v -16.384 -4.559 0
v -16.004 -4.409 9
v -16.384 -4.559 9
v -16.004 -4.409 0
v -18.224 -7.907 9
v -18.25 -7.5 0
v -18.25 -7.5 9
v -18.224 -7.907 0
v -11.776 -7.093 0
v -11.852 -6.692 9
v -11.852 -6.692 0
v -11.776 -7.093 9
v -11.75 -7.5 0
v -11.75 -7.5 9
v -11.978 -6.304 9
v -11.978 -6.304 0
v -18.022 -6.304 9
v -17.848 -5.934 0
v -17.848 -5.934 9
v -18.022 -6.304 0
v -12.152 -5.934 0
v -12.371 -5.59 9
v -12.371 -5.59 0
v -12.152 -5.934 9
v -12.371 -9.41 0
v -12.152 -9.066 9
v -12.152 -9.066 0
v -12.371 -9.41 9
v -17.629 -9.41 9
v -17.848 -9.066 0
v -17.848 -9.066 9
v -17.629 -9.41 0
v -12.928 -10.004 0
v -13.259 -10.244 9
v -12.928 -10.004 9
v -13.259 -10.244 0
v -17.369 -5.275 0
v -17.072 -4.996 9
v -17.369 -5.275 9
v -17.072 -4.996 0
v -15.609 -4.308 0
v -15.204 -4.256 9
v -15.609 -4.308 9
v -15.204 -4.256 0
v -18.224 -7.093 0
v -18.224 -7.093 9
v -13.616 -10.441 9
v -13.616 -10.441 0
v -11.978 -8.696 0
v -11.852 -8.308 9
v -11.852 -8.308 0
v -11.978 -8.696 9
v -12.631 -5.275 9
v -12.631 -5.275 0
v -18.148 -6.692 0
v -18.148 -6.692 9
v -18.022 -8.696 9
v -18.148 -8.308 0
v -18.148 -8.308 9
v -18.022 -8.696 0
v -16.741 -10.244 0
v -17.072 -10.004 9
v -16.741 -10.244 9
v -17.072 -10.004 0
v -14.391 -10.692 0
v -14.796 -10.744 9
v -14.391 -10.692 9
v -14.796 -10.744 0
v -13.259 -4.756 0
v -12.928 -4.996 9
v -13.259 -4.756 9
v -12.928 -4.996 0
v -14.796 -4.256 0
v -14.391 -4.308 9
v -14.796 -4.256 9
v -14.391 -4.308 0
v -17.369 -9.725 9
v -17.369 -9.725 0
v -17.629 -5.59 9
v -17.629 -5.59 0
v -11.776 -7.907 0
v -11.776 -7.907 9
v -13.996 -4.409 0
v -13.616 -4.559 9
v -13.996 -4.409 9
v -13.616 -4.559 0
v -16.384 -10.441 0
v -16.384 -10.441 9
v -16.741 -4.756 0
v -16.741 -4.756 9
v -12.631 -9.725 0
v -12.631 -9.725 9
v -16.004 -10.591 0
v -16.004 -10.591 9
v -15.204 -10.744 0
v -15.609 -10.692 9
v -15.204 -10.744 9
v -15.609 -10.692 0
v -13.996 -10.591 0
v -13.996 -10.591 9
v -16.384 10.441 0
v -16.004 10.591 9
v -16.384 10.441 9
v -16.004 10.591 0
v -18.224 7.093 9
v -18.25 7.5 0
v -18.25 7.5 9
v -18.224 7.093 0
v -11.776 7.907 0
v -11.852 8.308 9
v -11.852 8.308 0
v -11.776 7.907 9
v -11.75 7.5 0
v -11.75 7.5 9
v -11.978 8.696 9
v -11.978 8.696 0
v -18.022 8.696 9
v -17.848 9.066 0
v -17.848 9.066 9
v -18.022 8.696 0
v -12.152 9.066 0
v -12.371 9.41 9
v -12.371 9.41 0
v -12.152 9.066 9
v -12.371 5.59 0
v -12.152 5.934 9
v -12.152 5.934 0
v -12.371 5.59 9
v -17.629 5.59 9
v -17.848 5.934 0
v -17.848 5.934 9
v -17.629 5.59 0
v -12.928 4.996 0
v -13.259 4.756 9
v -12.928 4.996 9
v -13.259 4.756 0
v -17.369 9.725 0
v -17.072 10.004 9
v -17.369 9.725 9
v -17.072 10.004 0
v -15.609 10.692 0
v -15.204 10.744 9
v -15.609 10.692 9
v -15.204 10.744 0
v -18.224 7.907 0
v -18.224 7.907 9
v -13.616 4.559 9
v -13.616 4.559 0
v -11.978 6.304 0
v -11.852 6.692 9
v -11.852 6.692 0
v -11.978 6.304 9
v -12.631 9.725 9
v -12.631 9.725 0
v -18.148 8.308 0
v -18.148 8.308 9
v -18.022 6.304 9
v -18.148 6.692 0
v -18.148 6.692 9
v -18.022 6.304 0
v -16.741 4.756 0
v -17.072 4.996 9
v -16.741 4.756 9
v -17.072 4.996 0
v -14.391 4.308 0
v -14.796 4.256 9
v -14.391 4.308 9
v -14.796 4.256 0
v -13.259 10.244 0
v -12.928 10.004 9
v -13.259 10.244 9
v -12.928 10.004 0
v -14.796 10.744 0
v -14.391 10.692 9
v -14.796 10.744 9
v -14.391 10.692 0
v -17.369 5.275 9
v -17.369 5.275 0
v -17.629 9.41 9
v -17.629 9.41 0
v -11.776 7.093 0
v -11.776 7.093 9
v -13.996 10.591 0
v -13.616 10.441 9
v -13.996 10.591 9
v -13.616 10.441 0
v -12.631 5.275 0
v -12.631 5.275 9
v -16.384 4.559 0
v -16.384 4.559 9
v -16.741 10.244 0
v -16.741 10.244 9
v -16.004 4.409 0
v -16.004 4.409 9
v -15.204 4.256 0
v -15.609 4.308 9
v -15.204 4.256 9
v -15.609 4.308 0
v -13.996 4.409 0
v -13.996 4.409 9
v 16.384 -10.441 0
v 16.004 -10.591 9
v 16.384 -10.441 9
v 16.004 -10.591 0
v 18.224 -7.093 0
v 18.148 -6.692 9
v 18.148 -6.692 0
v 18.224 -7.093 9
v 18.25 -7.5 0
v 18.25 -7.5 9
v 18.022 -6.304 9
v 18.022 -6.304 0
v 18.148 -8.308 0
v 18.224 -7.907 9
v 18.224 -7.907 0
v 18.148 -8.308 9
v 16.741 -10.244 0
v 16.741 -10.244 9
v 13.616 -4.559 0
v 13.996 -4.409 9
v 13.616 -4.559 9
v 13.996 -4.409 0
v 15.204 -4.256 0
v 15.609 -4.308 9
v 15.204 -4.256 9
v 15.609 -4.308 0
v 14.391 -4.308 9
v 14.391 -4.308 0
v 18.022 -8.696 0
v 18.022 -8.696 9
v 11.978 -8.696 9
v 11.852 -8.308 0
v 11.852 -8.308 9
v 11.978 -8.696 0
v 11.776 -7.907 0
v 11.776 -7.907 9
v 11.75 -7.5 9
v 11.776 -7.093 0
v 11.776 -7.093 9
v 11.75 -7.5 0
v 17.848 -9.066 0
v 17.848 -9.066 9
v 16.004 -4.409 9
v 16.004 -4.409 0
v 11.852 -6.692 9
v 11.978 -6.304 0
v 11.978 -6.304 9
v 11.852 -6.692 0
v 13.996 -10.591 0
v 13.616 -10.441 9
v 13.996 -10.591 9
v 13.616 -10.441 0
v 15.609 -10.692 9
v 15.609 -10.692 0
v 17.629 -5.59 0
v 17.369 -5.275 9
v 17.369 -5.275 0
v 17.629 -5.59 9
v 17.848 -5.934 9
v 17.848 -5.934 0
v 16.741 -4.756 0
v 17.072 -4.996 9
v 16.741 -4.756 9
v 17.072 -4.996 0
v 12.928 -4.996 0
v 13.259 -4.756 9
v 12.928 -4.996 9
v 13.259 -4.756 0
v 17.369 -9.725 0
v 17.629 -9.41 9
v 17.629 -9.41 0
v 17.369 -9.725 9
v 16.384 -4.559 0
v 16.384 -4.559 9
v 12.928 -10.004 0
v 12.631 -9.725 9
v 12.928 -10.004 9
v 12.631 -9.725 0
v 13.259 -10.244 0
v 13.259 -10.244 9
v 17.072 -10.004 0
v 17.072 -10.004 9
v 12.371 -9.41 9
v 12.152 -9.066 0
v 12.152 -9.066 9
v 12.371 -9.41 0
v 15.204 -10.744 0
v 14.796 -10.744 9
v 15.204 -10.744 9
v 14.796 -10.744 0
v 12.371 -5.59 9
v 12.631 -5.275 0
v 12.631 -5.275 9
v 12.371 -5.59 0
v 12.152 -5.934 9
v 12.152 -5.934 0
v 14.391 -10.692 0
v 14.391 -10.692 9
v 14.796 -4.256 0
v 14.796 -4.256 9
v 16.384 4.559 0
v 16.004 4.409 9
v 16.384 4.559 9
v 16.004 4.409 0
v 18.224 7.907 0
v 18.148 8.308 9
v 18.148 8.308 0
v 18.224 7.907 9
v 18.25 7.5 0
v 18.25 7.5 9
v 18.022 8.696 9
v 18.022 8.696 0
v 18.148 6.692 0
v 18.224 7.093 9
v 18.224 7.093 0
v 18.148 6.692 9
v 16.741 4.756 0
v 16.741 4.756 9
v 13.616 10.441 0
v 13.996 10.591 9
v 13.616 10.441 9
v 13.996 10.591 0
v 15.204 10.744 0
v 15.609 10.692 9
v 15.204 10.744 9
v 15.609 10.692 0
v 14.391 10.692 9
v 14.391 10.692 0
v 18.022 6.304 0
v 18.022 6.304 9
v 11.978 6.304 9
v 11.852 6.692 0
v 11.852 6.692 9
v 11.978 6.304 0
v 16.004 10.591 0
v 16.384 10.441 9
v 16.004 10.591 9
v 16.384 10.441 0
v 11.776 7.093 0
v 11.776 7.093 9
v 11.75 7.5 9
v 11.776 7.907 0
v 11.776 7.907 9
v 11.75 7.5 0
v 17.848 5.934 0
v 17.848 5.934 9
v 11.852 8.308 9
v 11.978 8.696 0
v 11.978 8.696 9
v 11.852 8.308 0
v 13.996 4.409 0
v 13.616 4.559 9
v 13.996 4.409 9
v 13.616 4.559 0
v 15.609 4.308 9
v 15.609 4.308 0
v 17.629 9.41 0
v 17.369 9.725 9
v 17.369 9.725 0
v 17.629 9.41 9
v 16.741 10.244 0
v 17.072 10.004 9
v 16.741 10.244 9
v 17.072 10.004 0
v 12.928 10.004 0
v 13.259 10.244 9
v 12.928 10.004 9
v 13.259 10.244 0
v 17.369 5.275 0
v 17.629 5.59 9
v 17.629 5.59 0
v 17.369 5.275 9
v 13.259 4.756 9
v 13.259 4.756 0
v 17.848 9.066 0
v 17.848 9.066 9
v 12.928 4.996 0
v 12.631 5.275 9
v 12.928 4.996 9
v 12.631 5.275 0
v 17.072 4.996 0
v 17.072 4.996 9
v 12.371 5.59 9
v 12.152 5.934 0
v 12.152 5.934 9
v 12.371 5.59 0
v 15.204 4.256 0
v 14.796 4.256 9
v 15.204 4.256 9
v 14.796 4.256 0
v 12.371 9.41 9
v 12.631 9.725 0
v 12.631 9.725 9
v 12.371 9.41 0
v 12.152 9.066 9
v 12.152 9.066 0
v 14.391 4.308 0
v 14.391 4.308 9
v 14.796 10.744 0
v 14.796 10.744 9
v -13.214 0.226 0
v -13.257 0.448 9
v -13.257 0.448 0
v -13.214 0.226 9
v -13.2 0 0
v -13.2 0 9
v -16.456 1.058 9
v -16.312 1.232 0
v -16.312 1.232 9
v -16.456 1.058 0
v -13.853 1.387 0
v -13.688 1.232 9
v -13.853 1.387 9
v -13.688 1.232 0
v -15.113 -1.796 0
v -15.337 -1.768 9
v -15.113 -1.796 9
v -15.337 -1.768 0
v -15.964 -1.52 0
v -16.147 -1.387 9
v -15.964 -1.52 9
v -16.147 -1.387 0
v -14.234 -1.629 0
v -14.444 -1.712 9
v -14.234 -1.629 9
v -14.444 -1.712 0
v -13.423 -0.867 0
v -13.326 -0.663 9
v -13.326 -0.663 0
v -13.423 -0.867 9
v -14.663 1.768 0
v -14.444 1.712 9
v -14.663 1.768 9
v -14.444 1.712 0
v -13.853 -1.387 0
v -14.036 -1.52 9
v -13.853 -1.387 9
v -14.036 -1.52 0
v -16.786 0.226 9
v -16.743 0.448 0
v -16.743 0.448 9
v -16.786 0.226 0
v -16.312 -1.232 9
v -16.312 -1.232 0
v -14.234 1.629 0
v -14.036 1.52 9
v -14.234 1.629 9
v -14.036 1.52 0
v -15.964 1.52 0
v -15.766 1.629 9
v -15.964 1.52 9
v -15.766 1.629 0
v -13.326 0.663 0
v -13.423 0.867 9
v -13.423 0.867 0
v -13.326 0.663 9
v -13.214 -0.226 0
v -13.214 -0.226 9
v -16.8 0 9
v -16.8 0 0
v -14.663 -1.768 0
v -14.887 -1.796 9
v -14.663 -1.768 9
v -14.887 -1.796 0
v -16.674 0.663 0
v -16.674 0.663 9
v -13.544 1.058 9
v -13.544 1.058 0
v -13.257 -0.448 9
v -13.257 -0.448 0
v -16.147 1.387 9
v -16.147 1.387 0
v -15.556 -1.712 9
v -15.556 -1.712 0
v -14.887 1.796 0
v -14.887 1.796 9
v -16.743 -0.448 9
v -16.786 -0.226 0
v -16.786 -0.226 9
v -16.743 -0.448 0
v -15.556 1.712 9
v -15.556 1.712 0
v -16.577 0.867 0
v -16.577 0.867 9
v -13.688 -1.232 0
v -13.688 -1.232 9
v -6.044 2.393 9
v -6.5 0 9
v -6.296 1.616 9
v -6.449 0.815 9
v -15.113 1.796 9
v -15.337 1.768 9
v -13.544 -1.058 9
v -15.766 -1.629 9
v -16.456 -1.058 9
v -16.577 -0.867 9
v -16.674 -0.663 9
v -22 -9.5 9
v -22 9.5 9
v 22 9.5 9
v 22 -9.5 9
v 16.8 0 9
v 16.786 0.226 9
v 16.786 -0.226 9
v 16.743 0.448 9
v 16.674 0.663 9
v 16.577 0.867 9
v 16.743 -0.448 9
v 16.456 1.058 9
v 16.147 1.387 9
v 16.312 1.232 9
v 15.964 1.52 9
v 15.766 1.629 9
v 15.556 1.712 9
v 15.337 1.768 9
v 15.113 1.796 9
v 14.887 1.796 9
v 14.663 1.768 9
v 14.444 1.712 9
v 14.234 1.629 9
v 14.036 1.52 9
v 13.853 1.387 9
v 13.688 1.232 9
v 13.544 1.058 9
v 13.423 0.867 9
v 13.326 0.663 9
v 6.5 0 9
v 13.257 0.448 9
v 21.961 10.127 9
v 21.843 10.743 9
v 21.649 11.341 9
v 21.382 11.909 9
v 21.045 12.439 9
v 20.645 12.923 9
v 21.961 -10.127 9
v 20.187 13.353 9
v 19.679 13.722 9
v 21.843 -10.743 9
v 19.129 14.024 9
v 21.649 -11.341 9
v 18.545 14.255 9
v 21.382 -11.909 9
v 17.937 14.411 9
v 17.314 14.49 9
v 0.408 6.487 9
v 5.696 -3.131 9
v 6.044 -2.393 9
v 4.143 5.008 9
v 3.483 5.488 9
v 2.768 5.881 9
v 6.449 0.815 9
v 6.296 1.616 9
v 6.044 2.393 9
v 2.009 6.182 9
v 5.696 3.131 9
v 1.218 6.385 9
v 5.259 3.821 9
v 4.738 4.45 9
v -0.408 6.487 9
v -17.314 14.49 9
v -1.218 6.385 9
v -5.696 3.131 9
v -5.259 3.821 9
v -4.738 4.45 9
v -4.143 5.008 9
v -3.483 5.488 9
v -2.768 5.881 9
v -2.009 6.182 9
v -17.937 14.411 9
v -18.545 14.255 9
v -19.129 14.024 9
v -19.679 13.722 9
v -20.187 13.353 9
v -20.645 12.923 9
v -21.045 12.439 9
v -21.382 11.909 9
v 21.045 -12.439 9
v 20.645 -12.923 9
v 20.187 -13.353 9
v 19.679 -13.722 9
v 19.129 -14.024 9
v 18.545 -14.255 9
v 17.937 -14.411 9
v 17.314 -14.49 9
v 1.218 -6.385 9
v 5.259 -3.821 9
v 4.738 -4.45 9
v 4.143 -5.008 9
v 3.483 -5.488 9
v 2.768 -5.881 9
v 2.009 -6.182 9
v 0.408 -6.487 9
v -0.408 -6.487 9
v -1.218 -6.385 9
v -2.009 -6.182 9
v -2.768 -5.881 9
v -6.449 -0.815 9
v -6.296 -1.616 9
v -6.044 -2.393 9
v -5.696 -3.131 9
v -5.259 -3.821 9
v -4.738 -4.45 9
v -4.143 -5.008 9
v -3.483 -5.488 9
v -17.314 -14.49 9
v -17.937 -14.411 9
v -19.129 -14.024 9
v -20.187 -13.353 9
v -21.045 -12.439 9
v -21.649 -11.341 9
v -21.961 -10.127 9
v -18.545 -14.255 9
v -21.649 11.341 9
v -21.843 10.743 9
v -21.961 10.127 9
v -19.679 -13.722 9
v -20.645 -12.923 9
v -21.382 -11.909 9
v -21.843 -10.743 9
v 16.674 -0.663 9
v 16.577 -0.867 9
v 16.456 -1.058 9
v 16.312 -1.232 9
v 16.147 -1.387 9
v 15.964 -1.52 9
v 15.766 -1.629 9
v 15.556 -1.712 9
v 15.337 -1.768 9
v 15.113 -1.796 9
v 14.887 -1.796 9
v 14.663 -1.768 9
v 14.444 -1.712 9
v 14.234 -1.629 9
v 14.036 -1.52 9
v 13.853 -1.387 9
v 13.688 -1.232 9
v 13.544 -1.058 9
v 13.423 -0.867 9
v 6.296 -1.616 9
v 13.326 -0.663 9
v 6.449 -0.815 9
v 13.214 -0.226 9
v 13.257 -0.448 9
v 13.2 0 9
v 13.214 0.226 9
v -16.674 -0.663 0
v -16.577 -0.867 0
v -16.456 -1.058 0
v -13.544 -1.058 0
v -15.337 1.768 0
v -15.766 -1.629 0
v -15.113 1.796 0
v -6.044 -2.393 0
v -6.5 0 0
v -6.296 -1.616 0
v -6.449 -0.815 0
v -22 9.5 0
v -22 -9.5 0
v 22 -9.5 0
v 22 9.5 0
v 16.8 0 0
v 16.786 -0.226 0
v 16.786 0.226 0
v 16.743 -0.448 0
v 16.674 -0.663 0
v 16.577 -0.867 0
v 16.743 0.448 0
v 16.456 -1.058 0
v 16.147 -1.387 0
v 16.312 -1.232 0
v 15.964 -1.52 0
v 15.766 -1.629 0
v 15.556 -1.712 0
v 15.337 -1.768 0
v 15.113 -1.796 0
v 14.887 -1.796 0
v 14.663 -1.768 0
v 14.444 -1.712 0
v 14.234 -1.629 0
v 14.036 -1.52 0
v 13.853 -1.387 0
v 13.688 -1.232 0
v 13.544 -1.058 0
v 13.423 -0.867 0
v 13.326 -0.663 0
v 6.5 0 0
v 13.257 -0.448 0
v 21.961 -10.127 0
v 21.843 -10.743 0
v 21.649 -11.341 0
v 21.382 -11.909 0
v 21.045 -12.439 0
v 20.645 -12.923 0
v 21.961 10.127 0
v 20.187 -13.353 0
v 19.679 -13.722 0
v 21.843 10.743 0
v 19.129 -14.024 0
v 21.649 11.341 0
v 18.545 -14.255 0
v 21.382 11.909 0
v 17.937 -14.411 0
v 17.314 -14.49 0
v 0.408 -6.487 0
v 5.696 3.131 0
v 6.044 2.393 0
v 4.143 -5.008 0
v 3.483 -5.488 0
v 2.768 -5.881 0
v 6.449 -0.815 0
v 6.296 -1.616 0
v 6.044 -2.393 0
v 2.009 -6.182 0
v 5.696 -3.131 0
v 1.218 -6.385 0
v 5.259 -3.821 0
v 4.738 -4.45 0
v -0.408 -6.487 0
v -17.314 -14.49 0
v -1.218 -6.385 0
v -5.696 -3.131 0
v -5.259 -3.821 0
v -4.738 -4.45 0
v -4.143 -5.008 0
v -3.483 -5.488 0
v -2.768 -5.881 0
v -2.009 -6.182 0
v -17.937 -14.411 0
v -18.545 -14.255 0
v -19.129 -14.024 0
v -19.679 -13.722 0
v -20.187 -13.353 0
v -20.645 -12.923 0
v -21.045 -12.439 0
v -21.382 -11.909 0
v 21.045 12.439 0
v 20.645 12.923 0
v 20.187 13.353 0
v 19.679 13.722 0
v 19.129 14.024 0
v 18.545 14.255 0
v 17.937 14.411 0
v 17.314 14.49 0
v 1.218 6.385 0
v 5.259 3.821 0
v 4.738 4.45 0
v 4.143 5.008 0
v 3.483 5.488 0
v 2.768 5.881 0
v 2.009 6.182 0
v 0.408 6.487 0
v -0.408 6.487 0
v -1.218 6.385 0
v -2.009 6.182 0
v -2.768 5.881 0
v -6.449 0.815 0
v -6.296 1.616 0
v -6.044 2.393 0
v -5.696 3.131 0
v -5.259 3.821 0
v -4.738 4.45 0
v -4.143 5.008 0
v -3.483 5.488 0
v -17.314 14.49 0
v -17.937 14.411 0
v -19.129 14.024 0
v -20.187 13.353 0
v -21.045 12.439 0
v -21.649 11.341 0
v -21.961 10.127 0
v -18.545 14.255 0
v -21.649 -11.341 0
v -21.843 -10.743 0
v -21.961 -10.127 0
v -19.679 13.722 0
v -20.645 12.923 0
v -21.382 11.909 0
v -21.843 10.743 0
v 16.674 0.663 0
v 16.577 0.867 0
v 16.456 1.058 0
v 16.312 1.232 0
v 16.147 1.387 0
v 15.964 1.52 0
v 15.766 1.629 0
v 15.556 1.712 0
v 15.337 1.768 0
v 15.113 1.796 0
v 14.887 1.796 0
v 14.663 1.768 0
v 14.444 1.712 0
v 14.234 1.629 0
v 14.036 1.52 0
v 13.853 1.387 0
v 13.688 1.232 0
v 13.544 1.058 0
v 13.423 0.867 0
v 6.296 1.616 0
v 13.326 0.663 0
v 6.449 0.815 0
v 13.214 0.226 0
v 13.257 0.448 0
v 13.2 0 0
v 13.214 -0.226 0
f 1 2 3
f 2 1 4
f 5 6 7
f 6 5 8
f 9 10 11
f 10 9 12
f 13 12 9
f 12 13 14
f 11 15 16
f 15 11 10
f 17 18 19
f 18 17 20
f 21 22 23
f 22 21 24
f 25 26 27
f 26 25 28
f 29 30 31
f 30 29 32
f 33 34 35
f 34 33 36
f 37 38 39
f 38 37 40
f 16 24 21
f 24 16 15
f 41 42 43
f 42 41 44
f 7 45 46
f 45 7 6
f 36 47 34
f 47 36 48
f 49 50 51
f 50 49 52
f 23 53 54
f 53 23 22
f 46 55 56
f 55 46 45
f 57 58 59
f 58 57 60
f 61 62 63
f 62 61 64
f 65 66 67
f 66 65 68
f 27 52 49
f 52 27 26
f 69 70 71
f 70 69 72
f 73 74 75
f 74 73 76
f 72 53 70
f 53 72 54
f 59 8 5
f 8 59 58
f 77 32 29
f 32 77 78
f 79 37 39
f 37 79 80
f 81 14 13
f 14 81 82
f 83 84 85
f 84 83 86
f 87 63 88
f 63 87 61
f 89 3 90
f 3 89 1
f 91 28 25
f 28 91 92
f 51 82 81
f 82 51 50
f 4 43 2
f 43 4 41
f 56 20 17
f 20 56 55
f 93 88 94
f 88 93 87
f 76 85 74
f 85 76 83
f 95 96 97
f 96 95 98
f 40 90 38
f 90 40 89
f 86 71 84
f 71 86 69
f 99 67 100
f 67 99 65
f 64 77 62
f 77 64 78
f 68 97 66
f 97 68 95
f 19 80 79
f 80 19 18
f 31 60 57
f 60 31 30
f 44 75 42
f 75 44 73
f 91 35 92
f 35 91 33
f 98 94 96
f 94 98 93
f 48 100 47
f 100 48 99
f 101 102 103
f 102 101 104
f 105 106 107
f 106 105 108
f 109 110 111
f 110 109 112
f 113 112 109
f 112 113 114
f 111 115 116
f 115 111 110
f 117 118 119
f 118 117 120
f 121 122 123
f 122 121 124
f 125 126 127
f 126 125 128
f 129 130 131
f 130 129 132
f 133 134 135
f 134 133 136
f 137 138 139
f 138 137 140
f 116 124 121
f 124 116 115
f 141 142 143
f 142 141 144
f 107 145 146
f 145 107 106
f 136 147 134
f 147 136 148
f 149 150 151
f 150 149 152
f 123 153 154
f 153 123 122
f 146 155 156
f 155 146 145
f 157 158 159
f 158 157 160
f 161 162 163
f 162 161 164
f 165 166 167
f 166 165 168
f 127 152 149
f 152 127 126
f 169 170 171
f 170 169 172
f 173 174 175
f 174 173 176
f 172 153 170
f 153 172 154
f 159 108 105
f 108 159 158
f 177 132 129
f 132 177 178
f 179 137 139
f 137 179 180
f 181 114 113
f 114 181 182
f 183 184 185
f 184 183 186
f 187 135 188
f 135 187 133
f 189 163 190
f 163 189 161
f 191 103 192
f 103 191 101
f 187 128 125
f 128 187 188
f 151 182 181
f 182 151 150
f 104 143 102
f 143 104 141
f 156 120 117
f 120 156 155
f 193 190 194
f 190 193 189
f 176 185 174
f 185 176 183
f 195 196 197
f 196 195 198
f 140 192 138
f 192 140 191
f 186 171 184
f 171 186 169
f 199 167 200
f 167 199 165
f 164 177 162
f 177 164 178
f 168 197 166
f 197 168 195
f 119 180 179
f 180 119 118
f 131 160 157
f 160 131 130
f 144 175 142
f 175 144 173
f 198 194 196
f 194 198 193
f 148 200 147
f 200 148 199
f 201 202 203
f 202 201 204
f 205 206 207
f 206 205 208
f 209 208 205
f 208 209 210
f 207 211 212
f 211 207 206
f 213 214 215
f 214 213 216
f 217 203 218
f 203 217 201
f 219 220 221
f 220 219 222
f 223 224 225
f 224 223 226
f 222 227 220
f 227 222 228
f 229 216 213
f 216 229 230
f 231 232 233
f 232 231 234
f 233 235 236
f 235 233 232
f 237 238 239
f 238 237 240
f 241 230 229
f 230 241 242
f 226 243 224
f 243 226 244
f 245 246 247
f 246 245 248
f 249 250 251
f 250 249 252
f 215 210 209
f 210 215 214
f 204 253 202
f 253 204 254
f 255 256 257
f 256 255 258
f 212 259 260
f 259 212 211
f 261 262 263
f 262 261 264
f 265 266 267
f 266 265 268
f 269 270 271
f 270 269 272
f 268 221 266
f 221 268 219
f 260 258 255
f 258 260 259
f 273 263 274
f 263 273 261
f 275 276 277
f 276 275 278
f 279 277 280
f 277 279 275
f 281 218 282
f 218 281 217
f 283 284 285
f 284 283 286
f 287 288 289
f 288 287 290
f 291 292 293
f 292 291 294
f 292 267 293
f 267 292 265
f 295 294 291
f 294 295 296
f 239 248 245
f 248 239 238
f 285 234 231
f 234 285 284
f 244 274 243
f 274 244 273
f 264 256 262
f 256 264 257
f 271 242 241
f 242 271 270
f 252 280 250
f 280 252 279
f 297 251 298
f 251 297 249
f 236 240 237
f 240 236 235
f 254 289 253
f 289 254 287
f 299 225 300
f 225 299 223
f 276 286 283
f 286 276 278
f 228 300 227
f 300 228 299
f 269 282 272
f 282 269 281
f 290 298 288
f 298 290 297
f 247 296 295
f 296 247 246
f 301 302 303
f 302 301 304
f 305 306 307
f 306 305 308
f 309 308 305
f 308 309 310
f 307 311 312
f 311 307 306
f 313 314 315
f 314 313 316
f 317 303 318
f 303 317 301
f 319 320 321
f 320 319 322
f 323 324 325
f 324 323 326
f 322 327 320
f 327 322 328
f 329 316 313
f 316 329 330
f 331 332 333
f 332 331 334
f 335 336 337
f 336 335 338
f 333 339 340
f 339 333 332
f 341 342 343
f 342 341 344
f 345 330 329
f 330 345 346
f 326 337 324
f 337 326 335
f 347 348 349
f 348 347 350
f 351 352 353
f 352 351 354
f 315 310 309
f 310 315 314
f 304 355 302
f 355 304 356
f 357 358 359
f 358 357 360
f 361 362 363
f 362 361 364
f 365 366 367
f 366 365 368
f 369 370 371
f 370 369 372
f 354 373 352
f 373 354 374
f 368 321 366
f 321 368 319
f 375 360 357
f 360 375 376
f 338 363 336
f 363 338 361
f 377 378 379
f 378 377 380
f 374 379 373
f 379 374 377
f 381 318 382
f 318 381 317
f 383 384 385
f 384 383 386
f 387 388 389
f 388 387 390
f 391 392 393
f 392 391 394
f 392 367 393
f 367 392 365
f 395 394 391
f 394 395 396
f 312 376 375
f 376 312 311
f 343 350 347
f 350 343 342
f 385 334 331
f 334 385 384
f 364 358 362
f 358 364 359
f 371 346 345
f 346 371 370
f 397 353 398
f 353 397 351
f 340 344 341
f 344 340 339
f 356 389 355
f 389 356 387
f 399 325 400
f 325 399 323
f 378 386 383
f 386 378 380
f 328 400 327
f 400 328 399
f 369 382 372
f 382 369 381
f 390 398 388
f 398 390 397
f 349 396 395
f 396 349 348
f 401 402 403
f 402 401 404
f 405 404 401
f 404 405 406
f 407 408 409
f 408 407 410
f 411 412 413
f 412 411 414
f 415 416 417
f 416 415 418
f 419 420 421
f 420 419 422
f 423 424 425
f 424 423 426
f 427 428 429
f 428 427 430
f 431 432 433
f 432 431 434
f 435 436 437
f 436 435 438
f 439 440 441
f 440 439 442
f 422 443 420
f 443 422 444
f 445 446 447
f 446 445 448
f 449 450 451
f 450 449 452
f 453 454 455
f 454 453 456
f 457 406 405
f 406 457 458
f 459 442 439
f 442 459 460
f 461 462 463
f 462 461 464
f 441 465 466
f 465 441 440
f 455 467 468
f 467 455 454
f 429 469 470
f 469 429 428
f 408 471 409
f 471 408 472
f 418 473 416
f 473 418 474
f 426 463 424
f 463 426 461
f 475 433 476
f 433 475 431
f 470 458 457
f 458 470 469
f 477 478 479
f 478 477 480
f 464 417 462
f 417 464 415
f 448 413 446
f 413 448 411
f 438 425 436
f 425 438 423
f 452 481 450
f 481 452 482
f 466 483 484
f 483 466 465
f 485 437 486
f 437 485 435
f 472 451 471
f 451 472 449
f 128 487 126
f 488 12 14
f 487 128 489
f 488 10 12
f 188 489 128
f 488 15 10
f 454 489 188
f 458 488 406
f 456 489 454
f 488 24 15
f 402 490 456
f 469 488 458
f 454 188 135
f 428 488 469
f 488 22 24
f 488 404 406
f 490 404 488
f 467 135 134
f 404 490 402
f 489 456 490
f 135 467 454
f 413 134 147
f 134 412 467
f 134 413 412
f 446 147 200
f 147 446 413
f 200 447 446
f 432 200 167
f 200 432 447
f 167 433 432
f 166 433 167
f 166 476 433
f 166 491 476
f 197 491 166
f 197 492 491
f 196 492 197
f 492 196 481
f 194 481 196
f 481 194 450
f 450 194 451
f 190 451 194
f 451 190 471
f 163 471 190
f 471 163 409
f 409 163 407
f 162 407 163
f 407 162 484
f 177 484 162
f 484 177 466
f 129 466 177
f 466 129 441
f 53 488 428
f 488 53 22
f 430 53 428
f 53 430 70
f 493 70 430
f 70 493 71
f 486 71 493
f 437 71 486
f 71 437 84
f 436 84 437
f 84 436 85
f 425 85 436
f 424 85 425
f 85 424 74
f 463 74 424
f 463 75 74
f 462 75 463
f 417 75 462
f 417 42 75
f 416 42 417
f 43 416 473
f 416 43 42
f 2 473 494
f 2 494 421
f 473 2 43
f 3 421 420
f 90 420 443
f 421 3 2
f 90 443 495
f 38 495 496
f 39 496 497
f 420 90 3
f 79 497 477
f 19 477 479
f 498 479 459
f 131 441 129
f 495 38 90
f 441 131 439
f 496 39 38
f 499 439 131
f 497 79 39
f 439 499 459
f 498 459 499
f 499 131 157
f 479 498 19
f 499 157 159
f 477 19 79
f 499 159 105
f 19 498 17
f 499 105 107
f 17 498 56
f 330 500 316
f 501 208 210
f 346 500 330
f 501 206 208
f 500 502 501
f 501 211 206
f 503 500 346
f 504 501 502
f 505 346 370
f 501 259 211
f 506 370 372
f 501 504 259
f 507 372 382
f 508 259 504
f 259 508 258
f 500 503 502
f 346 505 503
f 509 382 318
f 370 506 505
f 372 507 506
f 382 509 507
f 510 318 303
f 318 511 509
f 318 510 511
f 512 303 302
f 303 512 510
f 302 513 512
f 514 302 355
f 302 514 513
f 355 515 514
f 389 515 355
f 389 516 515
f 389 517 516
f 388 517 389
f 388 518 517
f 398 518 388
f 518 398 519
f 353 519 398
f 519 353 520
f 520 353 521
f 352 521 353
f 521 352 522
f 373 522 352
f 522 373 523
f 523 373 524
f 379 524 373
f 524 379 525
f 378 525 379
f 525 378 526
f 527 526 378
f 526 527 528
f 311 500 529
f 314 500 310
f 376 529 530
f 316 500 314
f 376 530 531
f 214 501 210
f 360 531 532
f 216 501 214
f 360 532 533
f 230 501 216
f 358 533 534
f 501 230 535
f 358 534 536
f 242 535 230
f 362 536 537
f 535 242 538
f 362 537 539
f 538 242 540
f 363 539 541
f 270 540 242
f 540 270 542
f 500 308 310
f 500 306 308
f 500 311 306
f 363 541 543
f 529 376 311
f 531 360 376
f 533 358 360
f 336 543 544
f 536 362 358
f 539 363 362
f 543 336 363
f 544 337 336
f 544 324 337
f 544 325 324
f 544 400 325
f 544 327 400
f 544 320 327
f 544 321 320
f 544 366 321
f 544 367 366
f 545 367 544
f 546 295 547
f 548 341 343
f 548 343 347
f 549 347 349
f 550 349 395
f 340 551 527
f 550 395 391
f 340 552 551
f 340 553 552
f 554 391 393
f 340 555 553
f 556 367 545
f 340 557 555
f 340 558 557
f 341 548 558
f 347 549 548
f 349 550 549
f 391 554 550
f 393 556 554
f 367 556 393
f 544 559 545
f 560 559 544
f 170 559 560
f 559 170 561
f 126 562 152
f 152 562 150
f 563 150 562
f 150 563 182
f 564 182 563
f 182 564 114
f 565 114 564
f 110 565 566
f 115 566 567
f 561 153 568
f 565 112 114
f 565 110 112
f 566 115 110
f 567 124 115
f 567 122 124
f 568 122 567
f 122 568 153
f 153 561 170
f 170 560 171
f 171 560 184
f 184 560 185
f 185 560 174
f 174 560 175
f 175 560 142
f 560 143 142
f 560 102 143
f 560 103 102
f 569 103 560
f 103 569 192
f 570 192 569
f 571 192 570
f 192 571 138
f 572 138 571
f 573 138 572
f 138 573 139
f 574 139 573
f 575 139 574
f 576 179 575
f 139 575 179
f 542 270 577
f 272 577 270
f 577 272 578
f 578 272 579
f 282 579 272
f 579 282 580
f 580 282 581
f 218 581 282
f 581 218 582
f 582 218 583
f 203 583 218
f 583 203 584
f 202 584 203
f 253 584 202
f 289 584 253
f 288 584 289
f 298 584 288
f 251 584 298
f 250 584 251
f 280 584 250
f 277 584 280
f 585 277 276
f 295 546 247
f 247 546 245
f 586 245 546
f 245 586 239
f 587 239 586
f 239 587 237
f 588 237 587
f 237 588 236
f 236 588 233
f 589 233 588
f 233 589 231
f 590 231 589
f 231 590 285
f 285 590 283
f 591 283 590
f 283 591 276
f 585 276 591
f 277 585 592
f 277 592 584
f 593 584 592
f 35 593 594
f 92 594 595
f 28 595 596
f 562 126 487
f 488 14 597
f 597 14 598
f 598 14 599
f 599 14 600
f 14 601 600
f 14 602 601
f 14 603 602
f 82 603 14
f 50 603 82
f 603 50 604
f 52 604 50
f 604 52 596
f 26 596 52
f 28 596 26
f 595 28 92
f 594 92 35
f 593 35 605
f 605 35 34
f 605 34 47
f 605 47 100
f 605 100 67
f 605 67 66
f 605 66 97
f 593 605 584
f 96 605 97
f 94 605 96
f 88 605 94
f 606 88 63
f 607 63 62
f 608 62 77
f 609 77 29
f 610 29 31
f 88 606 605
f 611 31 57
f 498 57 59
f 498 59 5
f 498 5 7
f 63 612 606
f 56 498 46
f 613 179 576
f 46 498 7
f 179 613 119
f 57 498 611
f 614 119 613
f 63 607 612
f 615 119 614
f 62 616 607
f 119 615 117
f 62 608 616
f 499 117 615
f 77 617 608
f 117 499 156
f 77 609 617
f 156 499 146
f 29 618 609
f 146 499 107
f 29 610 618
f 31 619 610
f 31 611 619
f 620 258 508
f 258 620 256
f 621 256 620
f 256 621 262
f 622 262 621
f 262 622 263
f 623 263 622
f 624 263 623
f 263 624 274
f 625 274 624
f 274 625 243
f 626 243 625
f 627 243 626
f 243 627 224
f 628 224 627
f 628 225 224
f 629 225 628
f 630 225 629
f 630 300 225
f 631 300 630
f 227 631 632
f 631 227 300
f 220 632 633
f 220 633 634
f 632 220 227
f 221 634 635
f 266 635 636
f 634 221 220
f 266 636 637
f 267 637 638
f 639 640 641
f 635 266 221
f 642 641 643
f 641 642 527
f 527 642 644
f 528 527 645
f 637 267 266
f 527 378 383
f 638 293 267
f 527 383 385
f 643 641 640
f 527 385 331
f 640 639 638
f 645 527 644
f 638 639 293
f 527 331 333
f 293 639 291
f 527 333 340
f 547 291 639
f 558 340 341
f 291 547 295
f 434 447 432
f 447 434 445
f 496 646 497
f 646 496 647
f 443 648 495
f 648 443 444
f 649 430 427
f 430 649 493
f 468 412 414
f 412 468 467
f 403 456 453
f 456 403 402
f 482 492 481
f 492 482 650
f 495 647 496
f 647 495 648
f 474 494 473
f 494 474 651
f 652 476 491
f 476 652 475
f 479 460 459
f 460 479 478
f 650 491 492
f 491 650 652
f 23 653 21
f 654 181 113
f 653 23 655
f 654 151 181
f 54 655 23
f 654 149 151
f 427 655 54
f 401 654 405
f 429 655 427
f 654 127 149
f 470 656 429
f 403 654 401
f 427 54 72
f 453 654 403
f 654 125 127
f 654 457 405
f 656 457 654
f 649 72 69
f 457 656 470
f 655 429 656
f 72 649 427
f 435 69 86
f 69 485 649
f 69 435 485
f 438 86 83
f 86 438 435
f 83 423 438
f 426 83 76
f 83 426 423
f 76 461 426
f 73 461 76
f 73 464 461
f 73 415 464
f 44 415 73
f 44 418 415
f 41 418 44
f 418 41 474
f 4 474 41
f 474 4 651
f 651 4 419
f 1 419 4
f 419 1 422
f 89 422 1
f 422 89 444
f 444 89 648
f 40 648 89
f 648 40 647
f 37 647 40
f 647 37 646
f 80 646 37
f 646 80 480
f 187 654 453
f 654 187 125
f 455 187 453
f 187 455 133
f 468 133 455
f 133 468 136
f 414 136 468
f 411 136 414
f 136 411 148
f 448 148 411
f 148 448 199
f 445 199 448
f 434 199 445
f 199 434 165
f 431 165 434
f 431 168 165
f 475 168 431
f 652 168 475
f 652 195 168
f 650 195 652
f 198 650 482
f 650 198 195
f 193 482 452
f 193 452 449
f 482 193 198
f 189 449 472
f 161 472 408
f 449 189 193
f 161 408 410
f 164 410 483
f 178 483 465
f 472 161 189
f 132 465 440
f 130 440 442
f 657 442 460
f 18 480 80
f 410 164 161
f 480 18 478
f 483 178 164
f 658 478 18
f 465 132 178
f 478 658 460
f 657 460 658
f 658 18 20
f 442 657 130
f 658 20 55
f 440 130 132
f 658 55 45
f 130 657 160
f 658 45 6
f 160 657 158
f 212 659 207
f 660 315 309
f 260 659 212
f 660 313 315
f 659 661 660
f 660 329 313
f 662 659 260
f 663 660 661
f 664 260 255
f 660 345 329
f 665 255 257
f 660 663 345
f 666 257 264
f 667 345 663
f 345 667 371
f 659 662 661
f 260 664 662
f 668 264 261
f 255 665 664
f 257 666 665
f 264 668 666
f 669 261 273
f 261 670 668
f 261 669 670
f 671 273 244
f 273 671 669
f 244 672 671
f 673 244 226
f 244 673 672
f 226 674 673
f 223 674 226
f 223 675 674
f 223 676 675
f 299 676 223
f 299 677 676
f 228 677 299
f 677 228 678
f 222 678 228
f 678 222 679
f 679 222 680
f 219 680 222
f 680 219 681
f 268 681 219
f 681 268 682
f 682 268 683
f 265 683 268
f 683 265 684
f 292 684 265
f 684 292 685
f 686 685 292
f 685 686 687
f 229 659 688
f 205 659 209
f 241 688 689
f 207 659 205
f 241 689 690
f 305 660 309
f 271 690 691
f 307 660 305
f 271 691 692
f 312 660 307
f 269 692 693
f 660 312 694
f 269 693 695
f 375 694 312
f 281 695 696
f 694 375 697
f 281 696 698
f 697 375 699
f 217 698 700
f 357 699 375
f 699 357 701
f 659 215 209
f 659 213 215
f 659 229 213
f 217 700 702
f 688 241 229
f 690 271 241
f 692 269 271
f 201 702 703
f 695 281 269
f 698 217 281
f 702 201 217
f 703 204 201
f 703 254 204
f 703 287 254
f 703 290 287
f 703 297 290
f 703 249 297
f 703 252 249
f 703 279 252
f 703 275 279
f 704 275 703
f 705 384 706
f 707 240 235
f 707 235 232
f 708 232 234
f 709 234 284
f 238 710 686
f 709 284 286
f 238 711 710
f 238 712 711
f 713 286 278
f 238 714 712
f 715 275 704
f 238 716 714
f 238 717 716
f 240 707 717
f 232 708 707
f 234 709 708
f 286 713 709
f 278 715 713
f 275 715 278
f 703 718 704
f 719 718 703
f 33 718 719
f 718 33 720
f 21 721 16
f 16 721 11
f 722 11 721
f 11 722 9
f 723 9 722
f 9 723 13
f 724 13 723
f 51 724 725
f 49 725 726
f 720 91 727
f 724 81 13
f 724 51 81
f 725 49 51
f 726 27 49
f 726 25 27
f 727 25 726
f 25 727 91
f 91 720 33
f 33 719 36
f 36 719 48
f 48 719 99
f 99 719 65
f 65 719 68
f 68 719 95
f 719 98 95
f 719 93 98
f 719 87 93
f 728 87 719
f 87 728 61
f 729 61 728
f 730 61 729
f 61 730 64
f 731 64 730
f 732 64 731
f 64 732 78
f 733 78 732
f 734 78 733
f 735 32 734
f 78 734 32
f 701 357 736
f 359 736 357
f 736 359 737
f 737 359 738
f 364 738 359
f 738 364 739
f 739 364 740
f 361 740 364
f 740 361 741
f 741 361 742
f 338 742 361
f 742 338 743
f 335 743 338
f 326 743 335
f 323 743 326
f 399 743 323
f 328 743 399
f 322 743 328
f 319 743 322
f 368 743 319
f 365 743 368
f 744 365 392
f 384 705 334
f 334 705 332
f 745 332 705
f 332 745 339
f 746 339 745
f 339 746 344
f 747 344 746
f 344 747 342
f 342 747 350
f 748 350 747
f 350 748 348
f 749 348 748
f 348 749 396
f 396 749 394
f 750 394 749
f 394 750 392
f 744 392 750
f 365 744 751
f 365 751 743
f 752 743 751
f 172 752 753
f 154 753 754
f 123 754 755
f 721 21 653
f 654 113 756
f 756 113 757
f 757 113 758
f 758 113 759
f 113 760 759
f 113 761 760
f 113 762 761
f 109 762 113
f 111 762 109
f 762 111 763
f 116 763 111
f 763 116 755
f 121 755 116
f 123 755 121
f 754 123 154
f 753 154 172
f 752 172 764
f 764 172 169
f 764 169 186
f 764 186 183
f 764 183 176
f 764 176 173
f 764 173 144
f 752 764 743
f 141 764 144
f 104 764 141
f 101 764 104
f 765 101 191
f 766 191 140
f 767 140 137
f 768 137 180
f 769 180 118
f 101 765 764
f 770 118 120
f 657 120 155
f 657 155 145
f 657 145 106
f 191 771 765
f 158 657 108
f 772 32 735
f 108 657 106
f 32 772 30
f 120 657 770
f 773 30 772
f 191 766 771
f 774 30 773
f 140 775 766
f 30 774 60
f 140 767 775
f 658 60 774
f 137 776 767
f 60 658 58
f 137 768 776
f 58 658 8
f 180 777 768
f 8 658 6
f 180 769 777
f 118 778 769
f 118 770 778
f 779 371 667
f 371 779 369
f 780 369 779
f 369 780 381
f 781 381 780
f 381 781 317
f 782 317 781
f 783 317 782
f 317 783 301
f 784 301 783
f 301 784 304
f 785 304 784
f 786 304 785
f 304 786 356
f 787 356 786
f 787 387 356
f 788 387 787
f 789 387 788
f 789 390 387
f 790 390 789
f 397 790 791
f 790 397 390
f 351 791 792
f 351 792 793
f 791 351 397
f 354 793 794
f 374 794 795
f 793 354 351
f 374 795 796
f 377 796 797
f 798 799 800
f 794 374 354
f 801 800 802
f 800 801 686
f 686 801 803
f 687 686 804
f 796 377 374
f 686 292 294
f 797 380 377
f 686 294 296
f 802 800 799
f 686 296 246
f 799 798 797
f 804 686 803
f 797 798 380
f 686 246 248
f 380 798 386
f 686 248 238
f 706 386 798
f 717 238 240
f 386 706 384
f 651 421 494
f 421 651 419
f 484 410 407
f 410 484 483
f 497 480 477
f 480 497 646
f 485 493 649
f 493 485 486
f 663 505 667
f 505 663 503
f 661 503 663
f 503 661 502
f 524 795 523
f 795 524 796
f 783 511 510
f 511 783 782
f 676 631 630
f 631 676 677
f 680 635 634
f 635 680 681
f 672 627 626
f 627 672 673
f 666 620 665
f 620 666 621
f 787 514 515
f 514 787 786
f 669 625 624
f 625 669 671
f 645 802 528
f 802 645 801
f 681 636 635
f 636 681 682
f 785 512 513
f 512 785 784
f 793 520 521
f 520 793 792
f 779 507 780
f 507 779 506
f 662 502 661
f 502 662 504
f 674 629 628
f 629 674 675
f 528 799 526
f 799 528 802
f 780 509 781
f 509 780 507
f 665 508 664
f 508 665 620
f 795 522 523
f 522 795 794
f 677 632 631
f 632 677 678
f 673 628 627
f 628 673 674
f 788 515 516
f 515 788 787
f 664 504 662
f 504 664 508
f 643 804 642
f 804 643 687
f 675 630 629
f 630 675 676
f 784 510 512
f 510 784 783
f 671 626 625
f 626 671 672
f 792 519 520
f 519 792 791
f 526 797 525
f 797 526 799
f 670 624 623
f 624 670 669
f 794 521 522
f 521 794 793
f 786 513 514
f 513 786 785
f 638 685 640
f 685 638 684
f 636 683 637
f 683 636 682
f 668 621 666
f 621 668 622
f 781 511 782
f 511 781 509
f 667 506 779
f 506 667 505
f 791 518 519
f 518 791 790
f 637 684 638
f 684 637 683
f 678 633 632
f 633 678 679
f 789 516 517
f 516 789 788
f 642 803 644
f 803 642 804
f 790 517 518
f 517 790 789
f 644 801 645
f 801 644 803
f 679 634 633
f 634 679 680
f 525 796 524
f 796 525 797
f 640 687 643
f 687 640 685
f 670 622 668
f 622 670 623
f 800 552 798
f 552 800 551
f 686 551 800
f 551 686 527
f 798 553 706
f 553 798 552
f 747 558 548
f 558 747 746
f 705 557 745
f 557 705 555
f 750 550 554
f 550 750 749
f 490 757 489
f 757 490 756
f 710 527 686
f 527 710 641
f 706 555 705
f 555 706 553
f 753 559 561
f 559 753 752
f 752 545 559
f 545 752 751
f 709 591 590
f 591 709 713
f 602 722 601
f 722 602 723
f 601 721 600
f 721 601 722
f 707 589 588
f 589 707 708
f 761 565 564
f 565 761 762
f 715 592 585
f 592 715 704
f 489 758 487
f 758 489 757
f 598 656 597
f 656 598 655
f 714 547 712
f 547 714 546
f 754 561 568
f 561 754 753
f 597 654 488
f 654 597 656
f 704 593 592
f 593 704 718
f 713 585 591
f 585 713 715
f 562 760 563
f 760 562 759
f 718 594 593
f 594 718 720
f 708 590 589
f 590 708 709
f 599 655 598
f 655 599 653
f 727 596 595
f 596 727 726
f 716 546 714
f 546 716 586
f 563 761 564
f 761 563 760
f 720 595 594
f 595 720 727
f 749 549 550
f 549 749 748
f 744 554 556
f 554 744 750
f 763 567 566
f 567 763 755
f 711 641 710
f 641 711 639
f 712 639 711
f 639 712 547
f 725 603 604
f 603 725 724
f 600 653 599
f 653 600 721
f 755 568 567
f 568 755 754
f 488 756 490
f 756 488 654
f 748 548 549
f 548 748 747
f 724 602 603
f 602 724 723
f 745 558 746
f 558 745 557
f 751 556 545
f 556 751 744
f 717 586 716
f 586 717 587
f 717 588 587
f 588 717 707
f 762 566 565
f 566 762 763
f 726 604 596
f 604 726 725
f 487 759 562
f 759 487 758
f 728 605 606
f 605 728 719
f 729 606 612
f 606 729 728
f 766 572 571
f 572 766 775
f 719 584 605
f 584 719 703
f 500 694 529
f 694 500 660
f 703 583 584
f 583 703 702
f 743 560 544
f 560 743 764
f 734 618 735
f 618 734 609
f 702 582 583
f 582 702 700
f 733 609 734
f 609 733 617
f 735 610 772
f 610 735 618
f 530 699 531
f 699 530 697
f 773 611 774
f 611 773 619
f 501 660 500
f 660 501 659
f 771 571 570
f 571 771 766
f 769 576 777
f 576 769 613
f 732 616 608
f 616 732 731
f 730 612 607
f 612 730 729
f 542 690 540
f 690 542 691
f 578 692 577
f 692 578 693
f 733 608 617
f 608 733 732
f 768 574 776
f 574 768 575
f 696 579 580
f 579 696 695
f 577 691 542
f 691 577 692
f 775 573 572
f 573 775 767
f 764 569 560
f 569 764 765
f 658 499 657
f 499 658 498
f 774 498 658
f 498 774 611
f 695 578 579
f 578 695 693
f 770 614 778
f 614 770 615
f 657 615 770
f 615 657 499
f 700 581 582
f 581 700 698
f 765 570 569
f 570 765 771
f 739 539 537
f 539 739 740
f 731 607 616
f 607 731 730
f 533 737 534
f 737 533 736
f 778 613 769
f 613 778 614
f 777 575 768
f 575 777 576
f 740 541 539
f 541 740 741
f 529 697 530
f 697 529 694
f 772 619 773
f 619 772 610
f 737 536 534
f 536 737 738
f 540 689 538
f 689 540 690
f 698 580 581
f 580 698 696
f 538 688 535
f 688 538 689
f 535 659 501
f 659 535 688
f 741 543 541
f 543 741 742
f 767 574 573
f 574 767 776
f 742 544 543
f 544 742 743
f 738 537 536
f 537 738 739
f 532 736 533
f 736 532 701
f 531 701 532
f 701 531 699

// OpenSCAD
$fn = 50;


difference() {
	union() {
		hull() {
			translate(v = [-17.0000000000, 9.5000000000, 0]) {
				cylinder(h = 9, r = 5);
			}
			translate(v = [17.0000000000, 9.5000000000, 0]) {
				cylinder(h = 9, r = 5);
			}
			translate(v = [-17.0000000000, -9.5000000000, 0]) {
				cylinder(h = 9, r = 5);
			}
			translate(v = [17.0000000000, -9.5000000000, 0]) {
				cylinder(h = 9, r = 5);
			}
		}
	}
	union() {
		#translate(v = [-15.0000000000, -7.5000000000, 0]) {
			cylinder(h = 9, r = 3.2500000000);
		}
		#translate(v = [-15.0000000000, 7.5000000000, 0]) {
			cylinder(h = 9, r = 3.2500000000);
		}
		#translate(v = [15.0000000000, -7.5000000000, 0]) {
			cylinder(h = 9, r = 3.2500000000);
		}
		#translate(v = [15.0000000000, 7.5000000000, 0]) {
			cylinder(h = 9, r = 3.2500000000);
		}
		#translate(v = [-15.0000000000, -7.5000000000, -100.0000000000]) {
			cylinder(h = 200, r = 3.2500000000);
		}
		#translate(v = [-15.0000000000, 7.5000000000, -100.0000000000]) {
			cylinder(h = 200, r = 3.2500000000);
		}
		#translate(v = [15.0000000000, -7.5000000000, -100.0000000000]) {
			cylinder(h = 200, r = 3.2500000000);
		}
		#translate(v = [15.0000000000, 7.5000000000, -100.0000000000]) {
			cylinder(h = 200, r = 3.2500000000);
		}
		#translate(v = [-15.0000000000, -7.5000000000, 0]) {
			cylinder(h = 9, r = 1.8000000000);
		}
		#translate(v = [-15.0000000000, 0.0000000000, 0]) {
			cylinder(h = 9, r = 1.8000000000);
		}
		#translate(v = [-15.0000000000, 7.5000000000, 0]) {
			cylinder(h = 9, r = 1.8000000000);
		}
		#translate(v = [15.0000000000, -7.5000000000, 0]) {
			cylinder(h = 9, r = 1.8000000000);
		}
		#translate(v = [15.0000000000, 0.0000000000, 0]) {
			cylinder(h = 9, r = 1.8000000000);
		}
		#translate(v = [15.0000000000, 7.5000000000, 0]) {
			cylinder(h = 9, r = 1.8000000000);
		}
		#translate(v = [-15.0000000000, -7.5000000000, 0]) {
			cylinder(h = 9, r = 1.8000000000);
		}
		#translate(v = [-15.0000000000, 0.0000000000, 0]) {
			cylinder(h = 9, r = 1.8000000000);
		}
		#translate(v = [-15.0000000000, 7.5000000000, 0]) {
			cylinder(h = 9, r = 1.8000000000);
		}
		#translate(v = [15.0000000000, -7.5000000000, 0]) {
			cylinder(h = 9, r = 1.8000000000);
		}
		#translate(v = [15.0000000000, 0.0000000000, 0]) {
			cylinder(h = 9, r = 1.8000000000);
		}
		#translate(v = [15.0000000000, 7.5000000000, 0]) {
			cylinder(h = 9, r = 1.8000000000);
		}
		#translate(v = [-15.0000000000, -7.5000000000, 0]) {
			cylinder(h = 9, r = 1.8000000000);
		}
		#translate(v = [-15.0000000000, 0.0000000000, 0]) {
			cylinder(h = 9, r = 1.8000000000);
		}
		#translate(v = [-15.0000000000, 7.5000000000, 0]) {
			cylinder(h = 9, r = 1.8000000000);
		}
		#translate(v = [15.0000000000, -7.5000000000, 0]) {
			cylinder(h = 9, r = 1.8000000000);
		}
		#translate(v = [15.0000000000, 0.0000000000, 0]) {
			cylinder(h = 9, r = 1.8000000000);
		}
		#translate(v = [15.0000000000, 7.5000000000, 0]) {
			cylinder(h = 9, r = 1.8000000000);
		}
		#cylinder(h = 9, r = 6.5000000000);
	}
}
